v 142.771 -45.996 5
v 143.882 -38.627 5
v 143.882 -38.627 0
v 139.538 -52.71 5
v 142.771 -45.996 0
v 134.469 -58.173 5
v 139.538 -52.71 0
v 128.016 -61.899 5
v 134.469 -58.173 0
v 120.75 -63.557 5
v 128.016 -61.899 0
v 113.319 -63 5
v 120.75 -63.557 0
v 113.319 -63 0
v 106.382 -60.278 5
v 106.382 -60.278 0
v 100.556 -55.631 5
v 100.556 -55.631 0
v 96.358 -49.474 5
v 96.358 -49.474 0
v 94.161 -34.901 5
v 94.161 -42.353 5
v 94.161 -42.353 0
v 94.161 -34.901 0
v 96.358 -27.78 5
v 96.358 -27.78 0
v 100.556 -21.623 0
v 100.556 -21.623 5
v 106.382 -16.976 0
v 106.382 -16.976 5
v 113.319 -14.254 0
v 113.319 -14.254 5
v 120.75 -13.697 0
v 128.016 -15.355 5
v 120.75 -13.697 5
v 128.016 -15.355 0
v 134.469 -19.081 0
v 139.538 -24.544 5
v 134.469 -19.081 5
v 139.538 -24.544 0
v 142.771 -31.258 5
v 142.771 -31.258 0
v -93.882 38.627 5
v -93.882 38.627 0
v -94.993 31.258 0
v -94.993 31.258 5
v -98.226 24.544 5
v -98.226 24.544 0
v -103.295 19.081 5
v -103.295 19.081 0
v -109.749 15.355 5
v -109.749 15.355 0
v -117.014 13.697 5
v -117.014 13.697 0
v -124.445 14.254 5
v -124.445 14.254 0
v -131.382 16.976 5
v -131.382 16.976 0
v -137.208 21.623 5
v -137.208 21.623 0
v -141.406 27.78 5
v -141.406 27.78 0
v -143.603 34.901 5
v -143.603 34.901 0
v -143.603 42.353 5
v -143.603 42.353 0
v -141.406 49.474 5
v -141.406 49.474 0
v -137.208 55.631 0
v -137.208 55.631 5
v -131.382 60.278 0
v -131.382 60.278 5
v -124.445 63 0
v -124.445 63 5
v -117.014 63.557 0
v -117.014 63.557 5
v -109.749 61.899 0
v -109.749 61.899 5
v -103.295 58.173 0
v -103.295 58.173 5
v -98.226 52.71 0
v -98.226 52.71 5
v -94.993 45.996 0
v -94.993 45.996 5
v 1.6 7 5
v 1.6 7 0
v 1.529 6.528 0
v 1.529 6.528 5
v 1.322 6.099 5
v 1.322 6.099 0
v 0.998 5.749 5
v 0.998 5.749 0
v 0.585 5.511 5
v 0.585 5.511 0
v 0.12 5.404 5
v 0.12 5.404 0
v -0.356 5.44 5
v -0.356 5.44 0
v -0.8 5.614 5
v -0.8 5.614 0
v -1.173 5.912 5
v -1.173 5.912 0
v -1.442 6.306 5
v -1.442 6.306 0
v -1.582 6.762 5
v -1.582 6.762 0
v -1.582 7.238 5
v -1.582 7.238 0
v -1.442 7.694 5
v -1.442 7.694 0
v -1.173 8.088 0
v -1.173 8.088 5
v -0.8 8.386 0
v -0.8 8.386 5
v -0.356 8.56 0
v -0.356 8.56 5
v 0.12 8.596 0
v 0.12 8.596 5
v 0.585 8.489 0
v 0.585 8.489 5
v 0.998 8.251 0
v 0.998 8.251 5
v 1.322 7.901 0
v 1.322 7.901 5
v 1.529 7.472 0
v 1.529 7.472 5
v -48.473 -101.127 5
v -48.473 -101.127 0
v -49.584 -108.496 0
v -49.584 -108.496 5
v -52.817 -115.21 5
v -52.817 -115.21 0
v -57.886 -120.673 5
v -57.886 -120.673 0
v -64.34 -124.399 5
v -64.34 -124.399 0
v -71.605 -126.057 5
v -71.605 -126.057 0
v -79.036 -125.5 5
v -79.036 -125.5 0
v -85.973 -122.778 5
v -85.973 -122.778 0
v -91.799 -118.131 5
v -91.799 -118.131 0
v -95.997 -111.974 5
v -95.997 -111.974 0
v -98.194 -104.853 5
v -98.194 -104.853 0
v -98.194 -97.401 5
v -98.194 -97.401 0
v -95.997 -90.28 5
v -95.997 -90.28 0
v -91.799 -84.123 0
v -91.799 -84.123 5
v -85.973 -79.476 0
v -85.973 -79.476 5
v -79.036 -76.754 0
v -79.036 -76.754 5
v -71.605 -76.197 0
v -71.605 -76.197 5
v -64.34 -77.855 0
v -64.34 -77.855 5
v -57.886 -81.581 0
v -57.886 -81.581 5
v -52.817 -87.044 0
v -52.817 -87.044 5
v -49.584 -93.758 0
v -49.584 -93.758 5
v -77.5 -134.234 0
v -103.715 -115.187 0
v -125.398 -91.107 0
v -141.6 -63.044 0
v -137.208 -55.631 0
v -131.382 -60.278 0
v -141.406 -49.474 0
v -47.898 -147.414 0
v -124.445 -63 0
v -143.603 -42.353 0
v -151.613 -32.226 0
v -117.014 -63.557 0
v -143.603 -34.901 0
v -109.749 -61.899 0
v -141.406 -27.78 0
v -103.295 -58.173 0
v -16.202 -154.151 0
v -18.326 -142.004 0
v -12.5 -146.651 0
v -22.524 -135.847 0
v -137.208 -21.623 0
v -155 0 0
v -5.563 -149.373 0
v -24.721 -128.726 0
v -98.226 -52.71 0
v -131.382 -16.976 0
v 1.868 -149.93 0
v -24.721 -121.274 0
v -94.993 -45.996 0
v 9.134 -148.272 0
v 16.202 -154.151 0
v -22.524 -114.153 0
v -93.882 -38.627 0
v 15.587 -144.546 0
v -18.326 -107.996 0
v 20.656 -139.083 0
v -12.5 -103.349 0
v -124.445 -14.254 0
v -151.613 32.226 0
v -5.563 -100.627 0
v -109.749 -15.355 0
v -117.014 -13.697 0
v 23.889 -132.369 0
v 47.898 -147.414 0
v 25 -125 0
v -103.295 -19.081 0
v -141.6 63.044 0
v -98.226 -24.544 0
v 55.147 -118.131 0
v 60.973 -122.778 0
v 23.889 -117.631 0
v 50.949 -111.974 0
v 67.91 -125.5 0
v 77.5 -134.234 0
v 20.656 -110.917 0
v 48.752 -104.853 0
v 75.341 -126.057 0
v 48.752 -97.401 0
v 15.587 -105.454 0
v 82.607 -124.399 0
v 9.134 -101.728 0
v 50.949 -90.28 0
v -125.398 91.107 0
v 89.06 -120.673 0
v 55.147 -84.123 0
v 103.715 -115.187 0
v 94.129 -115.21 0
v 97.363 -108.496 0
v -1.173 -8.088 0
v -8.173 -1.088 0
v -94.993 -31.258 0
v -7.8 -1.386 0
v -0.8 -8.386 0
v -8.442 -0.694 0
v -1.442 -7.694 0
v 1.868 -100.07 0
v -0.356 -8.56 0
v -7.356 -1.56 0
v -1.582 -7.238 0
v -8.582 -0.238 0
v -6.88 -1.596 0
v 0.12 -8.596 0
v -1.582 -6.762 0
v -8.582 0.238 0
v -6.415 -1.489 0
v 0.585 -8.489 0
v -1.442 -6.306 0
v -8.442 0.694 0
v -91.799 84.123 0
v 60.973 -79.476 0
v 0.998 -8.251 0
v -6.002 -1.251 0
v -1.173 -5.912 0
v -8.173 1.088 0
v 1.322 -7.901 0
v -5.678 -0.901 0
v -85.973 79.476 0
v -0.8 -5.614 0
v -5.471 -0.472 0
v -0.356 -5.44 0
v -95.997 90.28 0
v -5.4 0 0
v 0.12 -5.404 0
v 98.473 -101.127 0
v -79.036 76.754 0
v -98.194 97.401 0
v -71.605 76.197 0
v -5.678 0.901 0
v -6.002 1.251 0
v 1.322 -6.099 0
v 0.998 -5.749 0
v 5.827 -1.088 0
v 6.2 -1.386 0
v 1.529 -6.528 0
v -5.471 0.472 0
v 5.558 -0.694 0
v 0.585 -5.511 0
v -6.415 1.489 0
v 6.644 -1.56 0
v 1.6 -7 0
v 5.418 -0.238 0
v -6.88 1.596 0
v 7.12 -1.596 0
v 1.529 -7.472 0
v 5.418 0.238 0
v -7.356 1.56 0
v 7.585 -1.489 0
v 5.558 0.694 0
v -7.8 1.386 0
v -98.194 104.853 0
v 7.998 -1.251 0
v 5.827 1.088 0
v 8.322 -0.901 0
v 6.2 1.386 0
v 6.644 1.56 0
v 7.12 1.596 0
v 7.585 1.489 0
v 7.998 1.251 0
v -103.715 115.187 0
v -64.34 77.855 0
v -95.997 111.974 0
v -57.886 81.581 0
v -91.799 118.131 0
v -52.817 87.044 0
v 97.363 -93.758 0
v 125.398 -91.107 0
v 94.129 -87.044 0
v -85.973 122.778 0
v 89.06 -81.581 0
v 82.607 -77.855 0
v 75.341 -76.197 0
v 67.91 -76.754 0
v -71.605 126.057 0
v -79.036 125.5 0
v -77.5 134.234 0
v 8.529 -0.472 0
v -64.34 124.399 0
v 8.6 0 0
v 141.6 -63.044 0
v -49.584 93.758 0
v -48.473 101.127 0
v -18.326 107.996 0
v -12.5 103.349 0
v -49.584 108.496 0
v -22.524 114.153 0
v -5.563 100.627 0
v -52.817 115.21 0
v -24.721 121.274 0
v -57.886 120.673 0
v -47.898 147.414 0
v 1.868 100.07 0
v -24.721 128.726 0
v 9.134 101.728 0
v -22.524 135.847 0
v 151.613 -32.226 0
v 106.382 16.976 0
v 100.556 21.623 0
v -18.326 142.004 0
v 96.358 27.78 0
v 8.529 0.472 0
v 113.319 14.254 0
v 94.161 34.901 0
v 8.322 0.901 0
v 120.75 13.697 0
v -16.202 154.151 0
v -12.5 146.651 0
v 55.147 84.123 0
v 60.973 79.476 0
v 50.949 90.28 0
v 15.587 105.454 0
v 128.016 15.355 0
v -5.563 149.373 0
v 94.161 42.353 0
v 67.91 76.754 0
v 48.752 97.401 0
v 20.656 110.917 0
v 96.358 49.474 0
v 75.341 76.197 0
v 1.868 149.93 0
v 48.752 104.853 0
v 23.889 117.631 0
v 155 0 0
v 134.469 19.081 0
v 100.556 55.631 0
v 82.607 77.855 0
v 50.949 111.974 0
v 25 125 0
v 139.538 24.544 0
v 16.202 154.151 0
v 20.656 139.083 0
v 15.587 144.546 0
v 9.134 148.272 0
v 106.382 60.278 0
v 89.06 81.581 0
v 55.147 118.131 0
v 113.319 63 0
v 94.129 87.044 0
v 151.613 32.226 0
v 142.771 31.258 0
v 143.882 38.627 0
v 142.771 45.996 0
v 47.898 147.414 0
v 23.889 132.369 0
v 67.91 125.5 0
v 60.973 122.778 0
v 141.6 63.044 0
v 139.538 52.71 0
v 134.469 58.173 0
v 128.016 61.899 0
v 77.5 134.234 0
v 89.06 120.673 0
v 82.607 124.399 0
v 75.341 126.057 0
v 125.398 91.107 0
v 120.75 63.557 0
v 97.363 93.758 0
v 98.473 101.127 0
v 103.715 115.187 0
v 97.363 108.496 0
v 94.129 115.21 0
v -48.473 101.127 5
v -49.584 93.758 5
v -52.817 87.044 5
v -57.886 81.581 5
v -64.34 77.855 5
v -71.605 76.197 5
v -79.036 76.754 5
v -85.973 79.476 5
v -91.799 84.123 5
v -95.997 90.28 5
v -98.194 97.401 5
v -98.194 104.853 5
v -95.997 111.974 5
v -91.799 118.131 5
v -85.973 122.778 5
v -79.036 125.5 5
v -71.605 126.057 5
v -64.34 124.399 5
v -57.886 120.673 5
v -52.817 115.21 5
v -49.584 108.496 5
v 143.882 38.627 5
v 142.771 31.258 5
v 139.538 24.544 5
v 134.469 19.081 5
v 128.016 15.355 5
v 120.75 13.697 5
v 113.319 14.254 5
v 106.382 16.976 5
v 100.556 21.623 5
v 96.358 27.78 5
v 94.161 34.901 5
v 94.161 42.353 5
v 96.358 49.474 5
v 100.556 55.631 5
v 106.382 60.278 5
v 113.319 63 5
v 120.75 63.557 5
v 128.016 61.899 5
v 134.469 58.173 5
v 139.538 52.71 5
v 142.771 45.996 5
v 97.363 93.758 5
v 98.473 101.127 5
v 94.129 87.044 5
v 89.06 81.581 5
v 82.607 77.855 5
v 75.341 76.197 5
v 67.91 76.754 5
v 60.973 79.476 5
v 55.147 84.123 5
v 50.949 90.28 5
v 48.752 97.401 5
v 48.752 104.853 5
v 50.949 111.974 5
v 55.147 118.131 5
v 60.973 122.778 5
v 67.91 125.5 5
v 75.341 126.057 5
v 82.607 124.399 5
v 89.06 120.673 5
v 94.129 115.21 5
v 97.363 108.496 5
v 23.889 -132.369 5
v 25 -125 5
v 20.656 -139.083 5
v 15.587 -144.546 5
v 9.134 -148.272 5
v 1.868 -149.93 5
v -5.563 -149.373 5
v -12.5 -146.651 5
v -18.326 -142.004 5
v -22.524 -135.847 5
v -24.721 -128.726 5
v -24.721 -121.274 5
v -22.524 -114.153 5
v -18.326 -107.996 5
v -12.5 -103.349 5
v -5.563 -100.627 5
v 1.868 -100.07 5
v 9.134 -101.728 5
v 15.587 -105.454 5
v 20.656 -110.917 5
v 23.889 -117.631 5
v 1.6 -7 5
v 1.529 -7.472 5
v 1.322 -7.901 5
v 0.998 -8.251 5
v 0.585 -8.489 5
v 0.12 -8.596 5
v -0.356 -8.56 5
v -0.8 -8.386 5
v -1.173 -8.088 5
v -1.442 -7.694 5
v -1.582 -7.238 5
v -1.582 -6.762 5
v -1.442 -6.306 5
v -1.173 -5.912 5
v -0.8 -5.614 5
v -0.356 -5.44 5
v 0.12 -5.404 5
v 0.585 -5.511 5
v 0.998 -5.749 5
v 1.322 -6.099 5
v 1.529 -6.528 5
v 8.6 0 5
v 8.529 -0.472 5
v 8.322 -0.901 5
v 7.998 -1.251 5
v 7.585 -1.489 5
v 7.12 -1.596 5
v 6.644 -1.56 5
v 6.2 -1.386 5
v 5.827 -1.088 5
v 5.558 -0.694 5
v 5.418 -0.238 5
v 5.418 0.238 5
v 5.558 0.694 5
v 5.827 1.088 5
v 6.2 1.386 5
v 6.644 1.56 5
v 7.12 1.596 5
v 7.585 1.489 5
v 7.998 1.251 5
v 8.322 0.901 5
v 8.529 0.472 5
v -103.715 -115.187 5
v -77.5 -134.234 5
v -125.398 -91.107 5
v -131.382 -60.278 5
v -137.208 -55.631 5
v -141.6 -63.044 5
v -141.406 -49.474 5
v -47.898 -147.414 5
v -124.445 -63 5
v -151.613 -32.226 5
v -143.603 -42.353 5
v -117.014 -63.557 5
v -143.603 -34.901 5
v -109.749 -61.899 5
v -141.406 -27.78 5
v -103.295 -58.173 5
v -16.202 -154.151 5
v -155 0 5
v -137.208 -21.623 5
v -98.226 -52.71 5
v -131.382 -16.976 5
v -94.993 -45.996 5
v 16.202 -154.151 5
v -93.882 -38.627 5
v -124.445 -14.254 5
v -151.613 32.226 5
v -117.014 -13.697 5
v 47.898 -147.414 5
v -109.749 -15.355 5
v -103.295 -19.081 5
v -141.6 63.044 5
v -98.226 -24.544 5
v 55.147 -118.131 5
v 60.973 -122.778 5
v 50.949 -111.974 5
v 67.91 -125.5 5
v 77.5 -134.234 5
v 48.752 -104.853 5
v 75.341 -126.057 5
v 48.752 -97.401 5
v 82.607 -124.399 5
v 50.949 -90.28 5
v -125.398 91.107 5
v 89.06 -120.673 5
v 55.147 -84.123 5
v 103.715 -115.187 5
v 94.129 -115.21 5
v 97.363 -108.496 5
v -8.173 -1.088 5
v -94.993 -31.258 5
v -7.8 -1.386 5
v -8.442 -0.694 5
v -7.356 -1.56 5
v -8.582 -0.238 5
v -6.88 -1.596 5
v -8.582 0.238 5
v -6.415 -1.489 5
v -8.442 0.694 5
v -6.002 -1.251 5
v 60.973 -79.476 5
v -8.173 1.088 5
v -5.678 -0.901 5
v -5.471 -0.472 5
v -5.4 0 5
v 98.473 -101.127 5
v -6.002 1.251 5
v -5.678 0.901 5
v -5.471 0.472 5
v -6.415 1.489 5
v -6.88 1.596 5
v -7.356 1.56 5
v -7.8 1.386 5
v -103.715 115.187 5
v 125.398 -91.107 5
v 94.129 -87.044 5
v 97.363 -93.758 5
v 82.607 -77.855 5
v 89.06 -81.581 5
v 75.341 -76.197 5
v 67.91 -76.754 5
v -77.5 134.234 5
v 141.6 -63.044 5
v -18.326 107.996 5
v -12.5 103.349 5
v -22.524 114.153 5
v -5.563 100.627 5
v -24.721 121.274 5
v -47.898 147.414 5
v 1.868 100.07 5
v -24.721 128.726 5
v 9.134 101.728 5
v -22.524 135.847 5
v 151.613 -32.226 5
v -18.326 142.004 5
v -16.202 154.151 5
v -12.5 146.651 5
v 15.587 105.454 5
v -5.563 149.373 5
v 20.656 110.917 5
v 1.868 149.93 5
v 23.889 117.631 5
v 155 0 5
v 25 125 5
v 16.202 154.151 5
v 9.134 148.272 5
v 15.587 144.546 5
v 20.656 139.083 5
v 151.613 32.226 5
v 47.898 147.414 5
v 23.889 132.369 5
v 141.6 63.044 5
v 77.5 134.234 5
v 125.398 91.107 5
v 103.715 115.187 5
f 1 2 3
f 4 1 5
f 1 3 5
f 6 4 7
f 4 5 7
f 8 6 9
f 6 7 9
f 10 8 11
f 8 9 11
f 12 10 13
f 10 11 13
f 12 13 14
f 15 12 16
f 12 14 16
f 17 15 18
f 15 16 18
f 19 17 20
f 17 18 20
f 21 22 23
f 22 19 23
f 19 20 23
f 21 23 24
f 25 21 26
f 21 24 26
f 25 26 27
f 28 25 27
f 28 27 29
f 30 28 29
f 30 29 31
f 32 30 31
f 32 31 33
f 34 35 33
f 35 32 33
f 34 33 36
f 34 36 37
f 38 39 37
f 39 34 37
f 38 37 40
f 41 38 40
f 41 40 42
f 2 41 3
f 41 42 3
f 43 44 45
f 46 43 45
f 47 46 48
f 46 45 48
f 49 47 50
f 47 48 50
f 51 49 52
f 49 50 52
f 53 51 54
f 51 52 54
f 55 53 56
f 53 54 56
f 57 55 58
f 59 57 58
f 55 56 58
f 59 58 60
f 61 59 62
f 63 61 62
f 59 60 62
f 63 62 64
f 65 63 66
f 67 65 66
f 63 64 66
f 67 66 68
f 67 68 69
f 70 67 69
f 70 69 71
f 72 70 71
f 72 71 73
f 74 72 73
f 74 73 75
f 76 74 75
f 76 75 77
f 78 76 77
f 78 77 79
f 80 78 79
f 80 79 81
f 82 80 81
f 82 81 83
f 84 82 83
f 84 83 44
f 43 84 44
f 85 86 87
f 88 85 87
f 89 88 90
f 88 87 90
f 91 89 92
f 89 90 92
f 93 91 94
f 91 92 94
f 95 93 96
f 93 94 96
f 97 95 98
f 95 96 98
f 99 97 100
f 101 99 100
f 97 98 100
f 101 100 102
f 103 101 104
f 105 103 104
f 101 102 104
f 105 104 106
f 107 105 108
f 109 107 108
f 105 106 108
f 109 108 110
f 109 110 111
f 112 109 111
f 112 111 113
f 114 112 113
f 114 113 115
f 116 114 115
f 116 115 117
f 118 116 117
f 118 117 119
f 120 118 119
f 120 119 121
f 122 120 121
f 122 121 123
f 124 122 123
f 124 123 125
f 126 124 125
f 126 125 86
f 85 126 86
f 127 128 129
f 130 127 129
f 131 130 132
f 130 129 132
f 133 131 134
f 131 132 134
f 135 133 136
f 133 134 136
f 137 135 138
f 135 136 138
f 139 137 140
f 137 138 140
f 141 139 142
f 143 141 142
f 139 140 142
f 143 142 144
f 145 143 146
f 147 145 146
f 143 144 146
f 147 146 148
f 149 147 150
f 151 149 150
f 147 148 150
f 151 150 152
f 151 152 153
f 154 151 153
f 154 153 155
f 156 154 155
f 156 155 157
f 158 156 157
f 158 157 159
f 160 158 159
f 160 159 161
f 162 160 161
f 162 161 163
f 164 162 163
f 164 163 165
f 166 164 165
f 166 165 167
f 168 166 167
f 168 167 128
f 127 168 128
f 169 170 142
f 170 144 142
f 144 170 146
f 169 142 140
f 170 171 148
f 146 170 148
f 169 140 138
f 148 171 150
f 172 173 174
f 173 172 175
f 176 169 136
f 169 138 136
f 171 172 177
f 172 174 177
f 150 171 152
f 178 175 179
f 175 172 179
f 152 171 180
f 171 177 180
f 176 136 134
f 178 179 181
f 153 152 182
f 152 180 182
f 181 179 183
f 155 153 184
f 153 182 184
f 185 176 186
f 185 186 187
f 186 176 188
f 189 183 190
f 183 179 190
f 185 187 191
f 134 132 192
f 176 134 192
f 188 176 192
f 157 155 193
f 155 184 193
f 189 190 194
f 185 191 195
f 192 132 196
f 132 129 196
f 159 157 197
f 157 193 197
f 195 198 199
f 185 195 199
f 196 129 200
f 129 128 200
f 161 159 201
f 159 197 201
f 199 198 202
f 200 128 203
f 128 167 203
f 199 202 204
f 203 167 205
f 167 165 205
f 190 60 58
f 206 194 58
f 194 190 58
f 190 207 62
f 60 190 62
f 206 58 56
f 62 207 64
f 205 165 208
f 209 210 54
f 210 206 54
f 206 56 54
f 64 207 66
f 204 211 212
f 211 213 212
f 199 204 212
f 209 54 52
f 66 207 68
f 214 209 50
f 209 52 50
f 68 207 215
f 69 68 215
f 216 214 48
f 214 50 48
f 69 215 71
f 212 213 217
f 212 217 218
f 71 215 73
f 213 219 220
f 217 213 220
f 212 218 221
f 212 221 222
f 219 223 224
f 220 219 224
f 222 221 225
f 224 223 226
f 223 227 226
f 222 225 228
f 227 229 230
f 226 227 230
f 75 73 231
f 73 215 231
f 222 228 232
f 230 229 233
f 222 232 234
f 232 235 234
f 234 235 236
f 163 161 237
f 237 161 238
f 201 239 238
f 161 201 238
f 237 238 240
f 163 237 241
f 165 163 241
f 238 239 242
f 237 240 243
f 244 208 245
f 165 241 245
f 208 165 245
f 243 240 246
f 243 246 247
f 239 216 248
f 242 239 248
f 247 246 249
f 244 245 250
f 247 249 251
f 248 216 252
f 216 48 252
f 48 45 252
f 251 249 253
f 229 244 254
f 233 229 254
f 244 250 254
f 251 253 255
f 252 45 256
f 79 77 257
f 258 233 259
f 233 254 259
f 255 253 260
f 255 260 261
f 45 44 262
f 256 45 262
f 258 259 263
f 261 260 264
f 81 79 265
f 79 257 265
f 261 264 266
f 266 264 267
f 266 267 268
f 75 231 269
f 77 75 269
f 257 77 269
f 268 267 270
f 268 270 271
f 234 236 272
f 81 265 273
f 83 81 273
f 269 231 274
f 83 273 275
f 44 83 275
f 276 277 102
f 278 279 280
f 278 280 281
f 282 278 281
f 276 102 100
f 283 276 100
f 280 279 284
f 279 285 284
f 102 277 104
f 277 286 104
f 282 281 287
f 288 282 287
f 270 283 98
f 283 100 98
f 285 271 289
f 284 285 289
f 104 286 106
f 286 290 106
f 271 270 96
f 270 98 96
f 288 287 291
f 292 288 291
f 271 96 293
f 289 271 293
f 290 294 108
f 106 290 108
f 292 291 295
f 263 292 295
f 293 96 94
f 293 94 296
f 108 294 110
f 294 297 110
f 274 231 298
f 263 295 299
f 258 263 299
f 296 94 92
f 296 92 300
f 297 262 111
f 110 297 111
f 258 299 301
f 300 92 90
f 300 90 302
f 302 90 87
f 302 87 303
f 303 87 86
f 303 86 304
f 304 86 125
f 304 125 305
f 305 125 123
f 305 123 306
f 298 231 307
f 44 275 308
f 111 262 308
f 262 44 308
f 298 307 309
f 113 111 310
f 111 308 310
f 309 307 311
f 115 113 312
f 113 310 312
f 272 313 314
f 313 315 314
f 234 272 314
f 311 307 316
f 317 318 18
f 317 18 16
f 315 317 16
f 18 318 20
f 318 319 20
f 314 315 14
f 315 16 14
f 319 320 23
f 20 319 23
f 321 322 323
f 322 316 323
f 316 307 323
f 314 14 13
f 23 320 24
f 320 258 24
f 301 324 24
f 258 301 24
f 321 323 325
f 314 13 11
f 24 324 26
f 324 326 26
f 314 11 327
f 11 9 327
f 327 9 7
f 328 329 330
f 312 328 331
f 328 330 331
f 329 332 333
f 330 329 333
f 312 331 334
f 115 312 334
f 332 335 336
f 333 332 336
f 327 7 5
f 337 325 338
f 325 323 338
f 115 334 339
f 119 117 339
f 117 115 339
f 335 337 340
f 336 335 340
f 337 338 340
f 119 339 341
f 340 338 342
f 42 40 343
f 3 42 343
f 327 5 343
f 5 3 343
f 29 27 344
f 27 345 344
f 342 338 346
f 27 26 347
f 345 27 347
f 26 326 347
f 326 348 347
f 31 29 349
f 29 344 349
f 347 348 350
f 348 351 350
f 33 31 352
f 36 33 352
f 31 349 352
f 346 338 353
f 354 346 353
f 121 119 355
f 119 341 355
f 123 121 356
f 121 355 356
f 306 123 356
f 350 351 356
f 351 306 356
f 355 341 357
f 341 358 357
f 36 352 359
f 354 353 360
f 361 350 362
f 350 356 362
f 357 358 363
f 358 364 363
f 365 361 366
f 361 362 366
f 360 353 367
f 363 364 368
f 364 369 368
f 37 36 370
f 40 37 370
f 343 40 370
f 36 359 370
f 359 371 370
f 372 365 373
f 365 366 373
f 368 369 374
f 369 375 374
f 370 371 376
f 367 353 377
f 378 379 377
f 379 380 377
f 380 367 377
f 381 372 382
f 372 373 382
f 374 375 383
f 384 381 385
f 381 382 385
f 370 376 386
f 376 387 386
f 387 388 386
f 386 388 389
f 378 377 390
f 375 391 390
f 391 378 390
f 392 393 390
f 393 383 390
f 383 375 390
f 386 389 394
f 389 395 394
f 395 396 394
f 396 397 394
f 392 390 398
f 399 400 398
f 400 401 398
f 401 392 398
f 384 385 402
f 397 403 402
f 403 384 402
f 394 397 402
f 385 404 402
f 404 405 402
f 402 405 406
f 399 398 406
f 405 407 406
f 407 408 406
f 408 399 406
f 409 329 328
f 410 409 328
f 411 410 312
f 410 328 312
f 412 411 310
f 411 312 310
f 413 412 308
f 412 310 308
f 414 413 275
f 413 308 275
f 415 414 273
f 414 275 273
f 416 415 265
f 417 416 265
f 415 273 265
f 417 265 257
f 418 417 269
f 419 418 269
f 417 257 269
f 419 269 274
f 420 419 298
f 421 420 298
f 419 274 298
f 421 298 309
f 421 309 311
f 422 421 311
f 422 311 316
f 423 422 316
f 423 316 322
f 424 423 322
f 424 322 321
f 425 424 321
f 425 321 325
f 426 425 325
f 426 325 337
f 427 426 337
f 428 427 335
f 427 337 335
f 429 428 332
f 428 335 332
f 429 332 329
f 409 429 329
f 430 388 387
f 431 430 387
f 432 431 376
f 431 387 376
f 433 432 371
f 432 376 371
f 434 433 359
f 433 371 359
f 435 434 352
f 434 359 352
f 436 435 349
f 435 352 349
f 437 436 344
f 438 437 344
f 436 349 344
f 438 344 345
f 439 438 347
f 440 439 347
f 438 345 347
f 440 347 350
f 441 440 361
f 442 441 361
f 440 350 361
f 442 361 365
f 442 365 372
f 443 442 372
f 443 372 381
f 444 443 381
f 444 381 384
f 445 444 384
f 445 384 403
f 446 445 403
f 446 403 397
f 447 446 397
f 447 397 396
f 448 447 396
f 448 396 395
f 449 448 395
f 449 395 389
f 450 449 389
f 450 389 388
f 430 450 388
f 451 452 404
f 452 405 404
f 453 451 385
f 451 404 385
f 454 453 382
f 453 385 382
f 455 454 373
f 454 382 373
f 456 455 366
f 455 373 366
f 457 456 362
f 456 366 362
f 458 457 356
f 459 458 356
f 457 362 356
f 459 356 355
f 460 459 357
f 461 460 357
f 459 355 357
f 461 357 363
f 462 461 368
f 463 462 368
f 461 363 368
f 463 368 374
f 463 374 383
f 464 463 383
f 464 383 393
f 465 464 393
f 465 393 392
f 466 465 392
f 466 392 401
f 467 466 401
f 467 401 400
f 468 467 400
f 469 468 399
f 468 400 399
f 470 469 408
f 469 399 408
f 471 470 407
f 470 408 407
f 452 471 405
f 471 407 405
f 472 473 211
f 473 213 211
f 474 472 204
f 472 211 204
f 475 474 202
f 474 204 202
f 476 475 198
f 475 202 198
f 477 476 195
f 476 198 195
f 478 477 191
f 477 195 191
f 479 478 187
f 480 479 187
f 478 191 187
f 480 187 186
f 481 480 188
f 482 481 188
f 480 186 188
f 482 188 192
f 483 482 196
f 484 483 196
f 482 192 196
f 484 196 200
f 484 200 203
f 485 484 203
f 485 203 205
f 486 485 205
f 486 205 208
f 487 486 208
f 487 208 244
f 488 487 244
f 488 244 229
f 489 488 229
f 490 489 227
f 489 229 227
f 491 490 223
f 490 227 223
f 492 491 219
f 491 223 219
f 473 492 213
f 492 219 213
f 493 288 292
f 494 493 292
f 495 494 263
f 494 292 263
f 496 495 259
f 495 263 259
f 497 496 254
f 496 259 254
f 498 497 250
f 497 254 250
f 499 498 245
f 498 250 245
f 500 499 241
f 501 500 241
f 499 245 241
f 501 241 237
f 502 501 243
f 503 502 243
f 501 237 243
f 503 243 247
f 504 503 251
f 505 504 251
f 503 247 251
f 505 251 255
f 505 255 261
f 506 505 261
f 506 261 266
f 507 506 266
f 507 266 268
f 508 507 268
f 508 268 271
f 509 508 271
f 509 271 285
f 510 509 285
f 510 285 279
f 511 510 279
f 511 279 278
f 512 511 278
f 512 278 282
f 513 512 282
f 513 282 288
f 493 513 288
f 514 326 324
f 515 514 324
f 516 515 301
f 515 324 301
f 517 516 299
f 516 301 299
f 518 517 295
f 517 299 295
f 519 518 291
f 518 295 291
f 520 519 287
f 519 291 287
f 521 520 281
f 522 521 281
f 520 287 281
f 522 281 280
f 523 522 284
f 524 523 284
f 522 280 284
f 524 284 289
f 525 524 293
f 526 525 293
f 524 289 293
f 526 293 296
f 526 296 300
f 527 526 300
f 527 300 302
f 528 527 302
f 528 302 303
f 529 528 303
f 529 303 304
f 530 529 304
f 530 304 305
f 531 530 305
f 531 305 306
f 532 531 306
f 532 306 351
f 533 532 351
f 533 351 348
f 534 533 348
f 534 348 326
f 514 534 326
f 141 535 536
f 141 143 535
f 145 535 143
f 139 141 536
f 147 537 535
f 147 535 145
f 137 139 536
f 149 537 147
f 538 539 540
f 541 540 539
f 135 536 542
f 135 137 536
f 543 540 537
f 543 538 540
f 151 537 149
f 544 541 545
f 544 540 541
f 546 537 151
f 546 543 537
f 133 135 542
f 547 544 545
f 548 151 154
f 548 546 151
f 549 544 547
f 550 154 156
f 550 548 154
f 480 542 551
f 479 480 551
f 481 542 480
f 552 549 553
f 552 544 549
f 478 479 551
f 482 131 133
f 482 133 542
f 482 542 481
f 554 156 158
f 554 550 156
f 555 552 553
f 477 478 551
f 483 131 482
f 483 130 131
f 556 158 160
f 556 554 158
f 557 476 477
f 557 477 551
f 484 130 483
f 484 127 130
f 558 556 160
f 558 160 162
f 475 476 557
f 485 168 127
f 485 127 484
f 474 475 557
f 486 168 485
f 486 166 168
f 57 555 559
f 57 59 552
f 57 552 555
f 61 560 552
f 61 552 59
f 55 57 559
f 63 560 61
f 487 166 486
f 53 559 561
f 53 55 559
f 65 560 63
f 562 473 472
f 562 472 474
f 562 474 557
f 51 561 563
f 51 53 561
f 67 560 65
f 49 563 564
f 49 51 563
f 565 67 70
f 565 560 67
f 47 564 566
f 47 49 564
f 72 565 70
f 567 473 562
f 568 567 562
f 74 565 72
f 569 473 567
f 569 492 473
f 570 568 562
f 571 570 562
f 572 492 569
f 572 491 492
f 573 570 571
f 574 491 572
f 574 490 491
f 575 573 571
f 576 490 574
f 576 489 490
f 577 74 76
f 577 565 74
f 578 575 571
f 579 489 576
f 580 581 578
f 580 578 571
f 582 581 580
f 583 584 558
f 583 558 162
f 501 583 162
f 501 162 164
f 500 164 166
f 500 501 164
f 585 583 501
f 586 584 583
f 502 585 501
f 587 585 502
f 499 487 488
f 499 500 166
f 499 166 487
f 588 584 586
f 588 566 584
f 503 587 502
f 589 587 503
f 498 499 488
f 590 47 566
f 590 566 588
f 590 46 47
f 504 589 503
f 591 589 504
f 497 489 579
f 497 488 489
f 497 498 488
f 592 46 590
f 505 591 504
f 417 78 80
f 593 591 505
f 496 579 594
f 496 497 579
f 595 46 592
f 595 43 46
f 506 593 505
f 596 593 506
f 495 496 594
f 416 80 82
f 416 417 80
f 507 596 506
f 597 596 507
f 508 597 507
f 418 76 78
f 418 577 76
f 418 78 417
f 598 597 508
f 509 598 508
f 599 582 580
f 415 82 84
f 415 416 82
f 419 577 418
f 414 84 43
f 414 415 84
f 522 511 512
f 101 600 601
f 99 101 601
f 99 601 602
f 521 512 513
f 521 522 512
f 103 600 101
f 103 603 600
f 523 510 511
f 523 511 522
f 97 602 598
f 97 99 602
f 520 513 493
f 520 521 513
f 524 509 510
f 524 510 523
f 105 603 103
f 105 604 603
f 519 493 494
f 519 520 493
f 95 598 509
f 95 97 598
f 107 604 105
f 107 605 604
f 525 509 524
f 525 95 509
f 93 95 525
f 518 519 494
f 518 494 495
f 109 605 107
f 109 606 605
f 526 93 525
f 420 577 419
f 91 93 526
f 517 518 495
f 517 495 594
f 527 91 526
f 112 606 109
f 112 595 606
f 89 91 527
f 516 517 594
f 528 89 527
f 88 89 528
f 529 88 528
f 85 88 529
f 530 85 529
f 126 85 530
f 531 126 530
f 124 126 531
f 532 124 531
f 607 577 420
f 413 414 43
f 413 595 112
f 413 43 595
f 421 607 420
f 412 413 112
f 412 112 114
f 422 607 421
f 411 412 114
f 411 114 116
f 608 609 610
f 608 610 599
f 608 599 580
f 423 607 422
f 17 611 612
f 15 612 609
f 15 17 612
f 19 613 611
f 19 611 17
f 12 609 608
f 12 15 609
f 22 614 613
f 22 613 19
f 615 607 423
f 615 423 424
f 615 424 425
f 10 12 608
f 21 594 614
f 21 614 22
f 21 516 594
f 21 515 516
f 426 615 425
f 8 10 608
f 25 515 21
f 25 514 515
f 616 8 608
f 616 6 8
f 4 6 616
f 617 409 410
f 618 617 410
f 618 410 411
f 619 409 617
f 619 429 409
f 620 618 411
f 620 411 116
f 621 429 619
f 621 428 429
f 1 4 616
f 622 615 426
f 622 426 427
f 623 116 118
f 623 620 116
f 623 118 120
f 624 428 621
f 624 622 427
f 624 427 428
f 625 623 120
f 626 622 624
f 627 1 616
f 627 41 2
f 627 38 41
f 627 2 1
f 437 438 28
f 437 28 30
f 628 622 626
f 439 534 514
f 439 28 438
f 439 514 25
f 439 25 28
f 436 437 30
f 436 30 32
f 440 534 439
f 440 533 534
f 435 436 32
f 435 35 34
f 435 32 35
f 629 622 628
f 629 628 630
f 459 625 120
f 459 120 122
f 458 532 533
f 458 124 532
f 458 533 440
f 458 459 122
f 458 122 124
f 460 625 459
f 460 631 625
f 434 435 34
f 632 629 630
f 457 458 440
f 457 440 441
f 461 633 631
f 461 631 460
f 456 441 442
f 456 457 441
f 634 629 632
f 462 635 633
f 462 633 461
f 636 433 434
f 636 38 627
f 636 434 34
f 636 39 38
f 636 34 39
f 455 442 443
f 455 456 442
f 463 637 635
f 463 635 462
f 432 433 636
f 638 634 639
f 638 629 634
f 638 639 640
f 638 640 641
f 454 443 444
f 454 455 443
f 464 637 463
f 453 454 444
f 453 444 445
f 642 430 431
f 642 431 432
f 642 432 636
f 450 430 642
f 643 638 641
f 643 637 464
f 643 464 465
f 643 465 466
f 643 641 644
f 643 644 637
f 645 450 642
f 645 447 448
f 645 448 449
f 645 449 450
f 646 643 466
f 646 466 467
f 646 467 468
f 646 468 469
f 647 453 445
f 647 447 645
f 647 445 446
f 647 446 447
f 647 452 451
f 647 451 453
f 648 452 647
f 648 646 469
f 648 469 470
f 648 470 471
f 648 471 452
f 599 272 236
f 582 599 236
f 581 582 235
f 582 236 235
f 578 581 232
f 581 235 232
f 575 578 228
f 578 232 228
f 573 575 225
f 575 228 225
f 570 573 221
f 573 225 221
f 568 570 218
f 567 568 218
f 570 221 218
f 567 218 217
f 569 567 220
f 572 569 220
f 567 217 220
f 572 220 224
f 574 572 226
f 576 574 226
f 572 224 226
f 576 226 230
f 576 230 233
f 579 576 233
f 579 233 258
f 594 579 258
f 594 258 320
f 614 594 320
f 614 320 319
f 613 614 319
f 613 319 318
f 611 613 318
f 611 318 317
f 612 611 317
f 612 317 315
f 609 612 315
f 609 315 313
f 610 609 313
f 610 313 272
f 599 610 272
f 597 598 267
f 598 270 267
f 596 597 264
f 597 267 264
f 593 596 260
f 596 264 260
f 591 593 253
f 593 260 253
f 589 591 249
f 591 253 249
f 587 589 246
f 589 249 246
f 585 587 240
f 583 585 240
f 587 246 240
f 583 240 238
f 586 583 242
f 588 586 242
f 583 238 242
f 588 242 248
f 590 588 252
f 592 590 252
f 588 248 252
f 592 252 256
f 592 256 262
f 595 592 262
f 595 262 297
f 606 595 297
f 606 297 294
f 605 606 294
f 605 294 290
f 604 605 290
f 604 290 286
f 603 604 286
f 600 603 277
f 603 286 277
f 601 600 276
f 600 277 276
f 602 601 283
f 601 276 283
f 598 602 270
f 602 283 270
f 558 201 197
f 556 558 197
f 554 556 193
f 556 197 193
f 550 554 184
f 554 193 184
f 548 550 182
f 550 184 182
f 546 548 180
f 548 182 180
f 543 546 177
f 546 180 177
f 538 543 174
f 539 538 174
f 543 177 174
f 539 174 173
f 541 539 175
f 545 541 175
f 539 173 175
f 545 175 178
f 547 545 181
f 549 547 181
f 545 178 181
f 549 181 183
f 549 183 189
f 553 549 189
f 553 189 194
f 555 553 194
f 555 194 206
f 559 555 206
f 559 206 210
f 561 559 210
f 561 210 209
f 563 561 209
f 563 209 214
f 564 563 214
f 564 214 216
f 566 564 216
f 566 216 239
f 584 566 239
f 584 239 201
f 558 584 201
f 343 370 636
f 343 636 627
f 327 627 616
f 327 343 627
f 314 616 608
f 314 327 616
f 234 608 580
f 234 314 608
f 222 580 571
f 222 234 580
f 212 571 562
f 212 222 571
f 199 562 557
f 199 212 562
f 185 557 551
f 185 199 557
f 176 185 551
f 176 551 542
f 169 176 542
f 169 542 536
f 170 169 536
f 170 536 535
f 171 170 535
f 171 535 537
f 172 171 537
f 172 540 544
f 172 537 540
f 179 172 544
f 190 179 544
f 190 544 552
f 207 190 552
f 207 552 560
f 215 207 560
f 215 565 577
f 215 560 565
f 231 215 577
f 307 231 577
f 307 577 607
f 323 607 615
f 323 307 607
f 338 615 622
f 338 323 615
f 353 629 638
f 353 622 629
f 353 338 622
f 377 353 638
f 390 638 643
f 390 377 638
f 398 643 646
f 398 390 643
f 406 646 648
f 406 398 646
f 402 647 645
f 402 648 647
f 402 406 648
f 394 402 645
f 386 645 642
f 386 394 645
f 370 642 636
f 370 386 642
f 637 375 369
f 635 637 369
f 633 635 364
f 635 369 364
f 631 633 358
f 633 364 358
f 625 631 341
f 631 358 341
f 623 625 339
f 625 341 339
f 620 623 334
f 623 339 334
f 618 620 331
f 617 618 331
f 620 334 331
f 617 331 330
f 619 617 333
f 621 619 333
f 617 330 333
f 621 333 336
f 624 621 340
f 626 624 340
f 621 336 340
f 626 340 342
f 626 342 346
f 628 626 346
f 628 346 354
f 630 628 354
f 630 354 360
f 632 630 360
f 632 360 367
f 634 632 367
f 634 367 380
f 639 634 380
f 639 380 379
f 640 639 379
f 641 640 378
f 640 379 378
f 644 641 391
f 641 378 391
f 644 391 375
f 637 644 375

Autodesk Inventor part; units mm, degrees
ref_plane "YZ Plane" through (0, 0, 0) normal (1, 0, 0) x (0, 1, 0)
ref_plane "XZ Plane" through (0, 0, 0) normal (0, 1, 0) x (-1, 0, 0)
ref_plane "XY Plane" through (0, 0, 0) normal (0, 0, 1) x (1, 0, 0)
sketch "Sketch1" plane through (0, 0, 0) normal (0, 0, 1) x (1, 0, 0)
  circle A0 centre (0, 0) radius 150
  circle A1 centre (0, 0) radius 100
  circle A2 centre (0, -125) radius 25
  circle A3 centre (73.4732, -101.1271) radius 25
  circle A4 centre (118.8821, -38.6271) radius 25
  circle A5 centre (118.8821, 38.6271) radius 25
  circle A6 centre (73.4732, 101.1271) radius 25
  circle A7 centre (0, 125) radius 25
  circle A8 centre (-73.4732, 101.1271) radius 25
  circle A9 centre (-118.8821, 38.6271) radius 25
  circle A10 centre (-118.8821, -38.6271) radius 25
  circle A11 centre (-73.4732, -101.1271) radius 25
  circle A12 centre (0, 0) radius 50
  circle A13 centre (0, 0) radius 155
  circle A14 centre (0, 0) radius 20
  circle A15 centre (20, 0) radius 2.5
  circle A16 centre (0, -20) radius 2.5
  circle A17 centre (-20, 0) radius 2.5
  circle A18 centre (0, 20) radius 2.5
  circle A19 centre (0, 0) radius 7
  circle A20 centre (0, 7) radius 1.6
  circle A21 centre (7, 0) radius 1.6
  circle A22 centre (0, -7) radius 1.6
  circle A23 centre (-7, 0) radius 1.6
  dimension "d0" = 300
  dimension "d1" = 200
  dimension "d2" = 50
  dimension "d5" = 360
  dimension "d7" = 100
  dimension "d13" = 310
  dimension "d17" = 40
  dimension "d18" = 5
  dimension "d19" = 5
  dimension "d20" = 5
  dimension "d21" = 5
  dimension "d29" = 14
  dimension "d30" = 3.2
  dimension "d31" = 3.2
  dimension "d32" = 3.2
  dimension "d33" = 3.2
extrude "Extrusion1" add sketch "Sketch1" along normal blind 5 contours A0 A4 A1 A5 | A5 A1 A6 A0 | A0 A3 A1 A4 | A6 A1 A7 A0 | A1 | A0 A2 A1 A3 | A7 A1 A8 A0 | A0 A11 A1 A2 | A8 A1 A9 A0 | A0 A10 A1 A11 | A9 A1 A10 A0 | A12 | A13 | A14 A15 | A14 A15 | A15 A14 A16 A17 A18 | A18 A14 | A14 A18 | A16 A14 | A14 A16 | A17 A14 | A14 A17 | A19 A21 | A19 A21 | A21 A19 A22 A23 A20 | A20 A19 | A19 A20 | A22 A19 | A19 A22 | A23 A19 | A19 A23
extrude "Extrusion5" cut sketch "Sketch1" along normal blind 5 contours A19 A21 | A19 A21 | A20 A19 | A19 A20 | A22 A19 | A19 A22 | A23 A19 | A19 A23
equation "\"d0\" = 6 * Product_dia"
equation "\"d1\" = 4 * Product_dia"
equation "\"d2\" = Product_dia"
equation "\"d7\" = 2 * Product_dia"
equation "\"Product_dia\" = 50"
equation "\"GridTotalSize\" = 63"
equation "\"GridBorderThickness\" = 5"
equation "\"GridBorderFillets\" = 7"
equation "\"BaseTotalWidth\" = 352"
equation "\"GridProcutClearance\" = 3"
equation "\"ProductBaseHeight\" = 35"
properties material "Acetal Resin, Black"
